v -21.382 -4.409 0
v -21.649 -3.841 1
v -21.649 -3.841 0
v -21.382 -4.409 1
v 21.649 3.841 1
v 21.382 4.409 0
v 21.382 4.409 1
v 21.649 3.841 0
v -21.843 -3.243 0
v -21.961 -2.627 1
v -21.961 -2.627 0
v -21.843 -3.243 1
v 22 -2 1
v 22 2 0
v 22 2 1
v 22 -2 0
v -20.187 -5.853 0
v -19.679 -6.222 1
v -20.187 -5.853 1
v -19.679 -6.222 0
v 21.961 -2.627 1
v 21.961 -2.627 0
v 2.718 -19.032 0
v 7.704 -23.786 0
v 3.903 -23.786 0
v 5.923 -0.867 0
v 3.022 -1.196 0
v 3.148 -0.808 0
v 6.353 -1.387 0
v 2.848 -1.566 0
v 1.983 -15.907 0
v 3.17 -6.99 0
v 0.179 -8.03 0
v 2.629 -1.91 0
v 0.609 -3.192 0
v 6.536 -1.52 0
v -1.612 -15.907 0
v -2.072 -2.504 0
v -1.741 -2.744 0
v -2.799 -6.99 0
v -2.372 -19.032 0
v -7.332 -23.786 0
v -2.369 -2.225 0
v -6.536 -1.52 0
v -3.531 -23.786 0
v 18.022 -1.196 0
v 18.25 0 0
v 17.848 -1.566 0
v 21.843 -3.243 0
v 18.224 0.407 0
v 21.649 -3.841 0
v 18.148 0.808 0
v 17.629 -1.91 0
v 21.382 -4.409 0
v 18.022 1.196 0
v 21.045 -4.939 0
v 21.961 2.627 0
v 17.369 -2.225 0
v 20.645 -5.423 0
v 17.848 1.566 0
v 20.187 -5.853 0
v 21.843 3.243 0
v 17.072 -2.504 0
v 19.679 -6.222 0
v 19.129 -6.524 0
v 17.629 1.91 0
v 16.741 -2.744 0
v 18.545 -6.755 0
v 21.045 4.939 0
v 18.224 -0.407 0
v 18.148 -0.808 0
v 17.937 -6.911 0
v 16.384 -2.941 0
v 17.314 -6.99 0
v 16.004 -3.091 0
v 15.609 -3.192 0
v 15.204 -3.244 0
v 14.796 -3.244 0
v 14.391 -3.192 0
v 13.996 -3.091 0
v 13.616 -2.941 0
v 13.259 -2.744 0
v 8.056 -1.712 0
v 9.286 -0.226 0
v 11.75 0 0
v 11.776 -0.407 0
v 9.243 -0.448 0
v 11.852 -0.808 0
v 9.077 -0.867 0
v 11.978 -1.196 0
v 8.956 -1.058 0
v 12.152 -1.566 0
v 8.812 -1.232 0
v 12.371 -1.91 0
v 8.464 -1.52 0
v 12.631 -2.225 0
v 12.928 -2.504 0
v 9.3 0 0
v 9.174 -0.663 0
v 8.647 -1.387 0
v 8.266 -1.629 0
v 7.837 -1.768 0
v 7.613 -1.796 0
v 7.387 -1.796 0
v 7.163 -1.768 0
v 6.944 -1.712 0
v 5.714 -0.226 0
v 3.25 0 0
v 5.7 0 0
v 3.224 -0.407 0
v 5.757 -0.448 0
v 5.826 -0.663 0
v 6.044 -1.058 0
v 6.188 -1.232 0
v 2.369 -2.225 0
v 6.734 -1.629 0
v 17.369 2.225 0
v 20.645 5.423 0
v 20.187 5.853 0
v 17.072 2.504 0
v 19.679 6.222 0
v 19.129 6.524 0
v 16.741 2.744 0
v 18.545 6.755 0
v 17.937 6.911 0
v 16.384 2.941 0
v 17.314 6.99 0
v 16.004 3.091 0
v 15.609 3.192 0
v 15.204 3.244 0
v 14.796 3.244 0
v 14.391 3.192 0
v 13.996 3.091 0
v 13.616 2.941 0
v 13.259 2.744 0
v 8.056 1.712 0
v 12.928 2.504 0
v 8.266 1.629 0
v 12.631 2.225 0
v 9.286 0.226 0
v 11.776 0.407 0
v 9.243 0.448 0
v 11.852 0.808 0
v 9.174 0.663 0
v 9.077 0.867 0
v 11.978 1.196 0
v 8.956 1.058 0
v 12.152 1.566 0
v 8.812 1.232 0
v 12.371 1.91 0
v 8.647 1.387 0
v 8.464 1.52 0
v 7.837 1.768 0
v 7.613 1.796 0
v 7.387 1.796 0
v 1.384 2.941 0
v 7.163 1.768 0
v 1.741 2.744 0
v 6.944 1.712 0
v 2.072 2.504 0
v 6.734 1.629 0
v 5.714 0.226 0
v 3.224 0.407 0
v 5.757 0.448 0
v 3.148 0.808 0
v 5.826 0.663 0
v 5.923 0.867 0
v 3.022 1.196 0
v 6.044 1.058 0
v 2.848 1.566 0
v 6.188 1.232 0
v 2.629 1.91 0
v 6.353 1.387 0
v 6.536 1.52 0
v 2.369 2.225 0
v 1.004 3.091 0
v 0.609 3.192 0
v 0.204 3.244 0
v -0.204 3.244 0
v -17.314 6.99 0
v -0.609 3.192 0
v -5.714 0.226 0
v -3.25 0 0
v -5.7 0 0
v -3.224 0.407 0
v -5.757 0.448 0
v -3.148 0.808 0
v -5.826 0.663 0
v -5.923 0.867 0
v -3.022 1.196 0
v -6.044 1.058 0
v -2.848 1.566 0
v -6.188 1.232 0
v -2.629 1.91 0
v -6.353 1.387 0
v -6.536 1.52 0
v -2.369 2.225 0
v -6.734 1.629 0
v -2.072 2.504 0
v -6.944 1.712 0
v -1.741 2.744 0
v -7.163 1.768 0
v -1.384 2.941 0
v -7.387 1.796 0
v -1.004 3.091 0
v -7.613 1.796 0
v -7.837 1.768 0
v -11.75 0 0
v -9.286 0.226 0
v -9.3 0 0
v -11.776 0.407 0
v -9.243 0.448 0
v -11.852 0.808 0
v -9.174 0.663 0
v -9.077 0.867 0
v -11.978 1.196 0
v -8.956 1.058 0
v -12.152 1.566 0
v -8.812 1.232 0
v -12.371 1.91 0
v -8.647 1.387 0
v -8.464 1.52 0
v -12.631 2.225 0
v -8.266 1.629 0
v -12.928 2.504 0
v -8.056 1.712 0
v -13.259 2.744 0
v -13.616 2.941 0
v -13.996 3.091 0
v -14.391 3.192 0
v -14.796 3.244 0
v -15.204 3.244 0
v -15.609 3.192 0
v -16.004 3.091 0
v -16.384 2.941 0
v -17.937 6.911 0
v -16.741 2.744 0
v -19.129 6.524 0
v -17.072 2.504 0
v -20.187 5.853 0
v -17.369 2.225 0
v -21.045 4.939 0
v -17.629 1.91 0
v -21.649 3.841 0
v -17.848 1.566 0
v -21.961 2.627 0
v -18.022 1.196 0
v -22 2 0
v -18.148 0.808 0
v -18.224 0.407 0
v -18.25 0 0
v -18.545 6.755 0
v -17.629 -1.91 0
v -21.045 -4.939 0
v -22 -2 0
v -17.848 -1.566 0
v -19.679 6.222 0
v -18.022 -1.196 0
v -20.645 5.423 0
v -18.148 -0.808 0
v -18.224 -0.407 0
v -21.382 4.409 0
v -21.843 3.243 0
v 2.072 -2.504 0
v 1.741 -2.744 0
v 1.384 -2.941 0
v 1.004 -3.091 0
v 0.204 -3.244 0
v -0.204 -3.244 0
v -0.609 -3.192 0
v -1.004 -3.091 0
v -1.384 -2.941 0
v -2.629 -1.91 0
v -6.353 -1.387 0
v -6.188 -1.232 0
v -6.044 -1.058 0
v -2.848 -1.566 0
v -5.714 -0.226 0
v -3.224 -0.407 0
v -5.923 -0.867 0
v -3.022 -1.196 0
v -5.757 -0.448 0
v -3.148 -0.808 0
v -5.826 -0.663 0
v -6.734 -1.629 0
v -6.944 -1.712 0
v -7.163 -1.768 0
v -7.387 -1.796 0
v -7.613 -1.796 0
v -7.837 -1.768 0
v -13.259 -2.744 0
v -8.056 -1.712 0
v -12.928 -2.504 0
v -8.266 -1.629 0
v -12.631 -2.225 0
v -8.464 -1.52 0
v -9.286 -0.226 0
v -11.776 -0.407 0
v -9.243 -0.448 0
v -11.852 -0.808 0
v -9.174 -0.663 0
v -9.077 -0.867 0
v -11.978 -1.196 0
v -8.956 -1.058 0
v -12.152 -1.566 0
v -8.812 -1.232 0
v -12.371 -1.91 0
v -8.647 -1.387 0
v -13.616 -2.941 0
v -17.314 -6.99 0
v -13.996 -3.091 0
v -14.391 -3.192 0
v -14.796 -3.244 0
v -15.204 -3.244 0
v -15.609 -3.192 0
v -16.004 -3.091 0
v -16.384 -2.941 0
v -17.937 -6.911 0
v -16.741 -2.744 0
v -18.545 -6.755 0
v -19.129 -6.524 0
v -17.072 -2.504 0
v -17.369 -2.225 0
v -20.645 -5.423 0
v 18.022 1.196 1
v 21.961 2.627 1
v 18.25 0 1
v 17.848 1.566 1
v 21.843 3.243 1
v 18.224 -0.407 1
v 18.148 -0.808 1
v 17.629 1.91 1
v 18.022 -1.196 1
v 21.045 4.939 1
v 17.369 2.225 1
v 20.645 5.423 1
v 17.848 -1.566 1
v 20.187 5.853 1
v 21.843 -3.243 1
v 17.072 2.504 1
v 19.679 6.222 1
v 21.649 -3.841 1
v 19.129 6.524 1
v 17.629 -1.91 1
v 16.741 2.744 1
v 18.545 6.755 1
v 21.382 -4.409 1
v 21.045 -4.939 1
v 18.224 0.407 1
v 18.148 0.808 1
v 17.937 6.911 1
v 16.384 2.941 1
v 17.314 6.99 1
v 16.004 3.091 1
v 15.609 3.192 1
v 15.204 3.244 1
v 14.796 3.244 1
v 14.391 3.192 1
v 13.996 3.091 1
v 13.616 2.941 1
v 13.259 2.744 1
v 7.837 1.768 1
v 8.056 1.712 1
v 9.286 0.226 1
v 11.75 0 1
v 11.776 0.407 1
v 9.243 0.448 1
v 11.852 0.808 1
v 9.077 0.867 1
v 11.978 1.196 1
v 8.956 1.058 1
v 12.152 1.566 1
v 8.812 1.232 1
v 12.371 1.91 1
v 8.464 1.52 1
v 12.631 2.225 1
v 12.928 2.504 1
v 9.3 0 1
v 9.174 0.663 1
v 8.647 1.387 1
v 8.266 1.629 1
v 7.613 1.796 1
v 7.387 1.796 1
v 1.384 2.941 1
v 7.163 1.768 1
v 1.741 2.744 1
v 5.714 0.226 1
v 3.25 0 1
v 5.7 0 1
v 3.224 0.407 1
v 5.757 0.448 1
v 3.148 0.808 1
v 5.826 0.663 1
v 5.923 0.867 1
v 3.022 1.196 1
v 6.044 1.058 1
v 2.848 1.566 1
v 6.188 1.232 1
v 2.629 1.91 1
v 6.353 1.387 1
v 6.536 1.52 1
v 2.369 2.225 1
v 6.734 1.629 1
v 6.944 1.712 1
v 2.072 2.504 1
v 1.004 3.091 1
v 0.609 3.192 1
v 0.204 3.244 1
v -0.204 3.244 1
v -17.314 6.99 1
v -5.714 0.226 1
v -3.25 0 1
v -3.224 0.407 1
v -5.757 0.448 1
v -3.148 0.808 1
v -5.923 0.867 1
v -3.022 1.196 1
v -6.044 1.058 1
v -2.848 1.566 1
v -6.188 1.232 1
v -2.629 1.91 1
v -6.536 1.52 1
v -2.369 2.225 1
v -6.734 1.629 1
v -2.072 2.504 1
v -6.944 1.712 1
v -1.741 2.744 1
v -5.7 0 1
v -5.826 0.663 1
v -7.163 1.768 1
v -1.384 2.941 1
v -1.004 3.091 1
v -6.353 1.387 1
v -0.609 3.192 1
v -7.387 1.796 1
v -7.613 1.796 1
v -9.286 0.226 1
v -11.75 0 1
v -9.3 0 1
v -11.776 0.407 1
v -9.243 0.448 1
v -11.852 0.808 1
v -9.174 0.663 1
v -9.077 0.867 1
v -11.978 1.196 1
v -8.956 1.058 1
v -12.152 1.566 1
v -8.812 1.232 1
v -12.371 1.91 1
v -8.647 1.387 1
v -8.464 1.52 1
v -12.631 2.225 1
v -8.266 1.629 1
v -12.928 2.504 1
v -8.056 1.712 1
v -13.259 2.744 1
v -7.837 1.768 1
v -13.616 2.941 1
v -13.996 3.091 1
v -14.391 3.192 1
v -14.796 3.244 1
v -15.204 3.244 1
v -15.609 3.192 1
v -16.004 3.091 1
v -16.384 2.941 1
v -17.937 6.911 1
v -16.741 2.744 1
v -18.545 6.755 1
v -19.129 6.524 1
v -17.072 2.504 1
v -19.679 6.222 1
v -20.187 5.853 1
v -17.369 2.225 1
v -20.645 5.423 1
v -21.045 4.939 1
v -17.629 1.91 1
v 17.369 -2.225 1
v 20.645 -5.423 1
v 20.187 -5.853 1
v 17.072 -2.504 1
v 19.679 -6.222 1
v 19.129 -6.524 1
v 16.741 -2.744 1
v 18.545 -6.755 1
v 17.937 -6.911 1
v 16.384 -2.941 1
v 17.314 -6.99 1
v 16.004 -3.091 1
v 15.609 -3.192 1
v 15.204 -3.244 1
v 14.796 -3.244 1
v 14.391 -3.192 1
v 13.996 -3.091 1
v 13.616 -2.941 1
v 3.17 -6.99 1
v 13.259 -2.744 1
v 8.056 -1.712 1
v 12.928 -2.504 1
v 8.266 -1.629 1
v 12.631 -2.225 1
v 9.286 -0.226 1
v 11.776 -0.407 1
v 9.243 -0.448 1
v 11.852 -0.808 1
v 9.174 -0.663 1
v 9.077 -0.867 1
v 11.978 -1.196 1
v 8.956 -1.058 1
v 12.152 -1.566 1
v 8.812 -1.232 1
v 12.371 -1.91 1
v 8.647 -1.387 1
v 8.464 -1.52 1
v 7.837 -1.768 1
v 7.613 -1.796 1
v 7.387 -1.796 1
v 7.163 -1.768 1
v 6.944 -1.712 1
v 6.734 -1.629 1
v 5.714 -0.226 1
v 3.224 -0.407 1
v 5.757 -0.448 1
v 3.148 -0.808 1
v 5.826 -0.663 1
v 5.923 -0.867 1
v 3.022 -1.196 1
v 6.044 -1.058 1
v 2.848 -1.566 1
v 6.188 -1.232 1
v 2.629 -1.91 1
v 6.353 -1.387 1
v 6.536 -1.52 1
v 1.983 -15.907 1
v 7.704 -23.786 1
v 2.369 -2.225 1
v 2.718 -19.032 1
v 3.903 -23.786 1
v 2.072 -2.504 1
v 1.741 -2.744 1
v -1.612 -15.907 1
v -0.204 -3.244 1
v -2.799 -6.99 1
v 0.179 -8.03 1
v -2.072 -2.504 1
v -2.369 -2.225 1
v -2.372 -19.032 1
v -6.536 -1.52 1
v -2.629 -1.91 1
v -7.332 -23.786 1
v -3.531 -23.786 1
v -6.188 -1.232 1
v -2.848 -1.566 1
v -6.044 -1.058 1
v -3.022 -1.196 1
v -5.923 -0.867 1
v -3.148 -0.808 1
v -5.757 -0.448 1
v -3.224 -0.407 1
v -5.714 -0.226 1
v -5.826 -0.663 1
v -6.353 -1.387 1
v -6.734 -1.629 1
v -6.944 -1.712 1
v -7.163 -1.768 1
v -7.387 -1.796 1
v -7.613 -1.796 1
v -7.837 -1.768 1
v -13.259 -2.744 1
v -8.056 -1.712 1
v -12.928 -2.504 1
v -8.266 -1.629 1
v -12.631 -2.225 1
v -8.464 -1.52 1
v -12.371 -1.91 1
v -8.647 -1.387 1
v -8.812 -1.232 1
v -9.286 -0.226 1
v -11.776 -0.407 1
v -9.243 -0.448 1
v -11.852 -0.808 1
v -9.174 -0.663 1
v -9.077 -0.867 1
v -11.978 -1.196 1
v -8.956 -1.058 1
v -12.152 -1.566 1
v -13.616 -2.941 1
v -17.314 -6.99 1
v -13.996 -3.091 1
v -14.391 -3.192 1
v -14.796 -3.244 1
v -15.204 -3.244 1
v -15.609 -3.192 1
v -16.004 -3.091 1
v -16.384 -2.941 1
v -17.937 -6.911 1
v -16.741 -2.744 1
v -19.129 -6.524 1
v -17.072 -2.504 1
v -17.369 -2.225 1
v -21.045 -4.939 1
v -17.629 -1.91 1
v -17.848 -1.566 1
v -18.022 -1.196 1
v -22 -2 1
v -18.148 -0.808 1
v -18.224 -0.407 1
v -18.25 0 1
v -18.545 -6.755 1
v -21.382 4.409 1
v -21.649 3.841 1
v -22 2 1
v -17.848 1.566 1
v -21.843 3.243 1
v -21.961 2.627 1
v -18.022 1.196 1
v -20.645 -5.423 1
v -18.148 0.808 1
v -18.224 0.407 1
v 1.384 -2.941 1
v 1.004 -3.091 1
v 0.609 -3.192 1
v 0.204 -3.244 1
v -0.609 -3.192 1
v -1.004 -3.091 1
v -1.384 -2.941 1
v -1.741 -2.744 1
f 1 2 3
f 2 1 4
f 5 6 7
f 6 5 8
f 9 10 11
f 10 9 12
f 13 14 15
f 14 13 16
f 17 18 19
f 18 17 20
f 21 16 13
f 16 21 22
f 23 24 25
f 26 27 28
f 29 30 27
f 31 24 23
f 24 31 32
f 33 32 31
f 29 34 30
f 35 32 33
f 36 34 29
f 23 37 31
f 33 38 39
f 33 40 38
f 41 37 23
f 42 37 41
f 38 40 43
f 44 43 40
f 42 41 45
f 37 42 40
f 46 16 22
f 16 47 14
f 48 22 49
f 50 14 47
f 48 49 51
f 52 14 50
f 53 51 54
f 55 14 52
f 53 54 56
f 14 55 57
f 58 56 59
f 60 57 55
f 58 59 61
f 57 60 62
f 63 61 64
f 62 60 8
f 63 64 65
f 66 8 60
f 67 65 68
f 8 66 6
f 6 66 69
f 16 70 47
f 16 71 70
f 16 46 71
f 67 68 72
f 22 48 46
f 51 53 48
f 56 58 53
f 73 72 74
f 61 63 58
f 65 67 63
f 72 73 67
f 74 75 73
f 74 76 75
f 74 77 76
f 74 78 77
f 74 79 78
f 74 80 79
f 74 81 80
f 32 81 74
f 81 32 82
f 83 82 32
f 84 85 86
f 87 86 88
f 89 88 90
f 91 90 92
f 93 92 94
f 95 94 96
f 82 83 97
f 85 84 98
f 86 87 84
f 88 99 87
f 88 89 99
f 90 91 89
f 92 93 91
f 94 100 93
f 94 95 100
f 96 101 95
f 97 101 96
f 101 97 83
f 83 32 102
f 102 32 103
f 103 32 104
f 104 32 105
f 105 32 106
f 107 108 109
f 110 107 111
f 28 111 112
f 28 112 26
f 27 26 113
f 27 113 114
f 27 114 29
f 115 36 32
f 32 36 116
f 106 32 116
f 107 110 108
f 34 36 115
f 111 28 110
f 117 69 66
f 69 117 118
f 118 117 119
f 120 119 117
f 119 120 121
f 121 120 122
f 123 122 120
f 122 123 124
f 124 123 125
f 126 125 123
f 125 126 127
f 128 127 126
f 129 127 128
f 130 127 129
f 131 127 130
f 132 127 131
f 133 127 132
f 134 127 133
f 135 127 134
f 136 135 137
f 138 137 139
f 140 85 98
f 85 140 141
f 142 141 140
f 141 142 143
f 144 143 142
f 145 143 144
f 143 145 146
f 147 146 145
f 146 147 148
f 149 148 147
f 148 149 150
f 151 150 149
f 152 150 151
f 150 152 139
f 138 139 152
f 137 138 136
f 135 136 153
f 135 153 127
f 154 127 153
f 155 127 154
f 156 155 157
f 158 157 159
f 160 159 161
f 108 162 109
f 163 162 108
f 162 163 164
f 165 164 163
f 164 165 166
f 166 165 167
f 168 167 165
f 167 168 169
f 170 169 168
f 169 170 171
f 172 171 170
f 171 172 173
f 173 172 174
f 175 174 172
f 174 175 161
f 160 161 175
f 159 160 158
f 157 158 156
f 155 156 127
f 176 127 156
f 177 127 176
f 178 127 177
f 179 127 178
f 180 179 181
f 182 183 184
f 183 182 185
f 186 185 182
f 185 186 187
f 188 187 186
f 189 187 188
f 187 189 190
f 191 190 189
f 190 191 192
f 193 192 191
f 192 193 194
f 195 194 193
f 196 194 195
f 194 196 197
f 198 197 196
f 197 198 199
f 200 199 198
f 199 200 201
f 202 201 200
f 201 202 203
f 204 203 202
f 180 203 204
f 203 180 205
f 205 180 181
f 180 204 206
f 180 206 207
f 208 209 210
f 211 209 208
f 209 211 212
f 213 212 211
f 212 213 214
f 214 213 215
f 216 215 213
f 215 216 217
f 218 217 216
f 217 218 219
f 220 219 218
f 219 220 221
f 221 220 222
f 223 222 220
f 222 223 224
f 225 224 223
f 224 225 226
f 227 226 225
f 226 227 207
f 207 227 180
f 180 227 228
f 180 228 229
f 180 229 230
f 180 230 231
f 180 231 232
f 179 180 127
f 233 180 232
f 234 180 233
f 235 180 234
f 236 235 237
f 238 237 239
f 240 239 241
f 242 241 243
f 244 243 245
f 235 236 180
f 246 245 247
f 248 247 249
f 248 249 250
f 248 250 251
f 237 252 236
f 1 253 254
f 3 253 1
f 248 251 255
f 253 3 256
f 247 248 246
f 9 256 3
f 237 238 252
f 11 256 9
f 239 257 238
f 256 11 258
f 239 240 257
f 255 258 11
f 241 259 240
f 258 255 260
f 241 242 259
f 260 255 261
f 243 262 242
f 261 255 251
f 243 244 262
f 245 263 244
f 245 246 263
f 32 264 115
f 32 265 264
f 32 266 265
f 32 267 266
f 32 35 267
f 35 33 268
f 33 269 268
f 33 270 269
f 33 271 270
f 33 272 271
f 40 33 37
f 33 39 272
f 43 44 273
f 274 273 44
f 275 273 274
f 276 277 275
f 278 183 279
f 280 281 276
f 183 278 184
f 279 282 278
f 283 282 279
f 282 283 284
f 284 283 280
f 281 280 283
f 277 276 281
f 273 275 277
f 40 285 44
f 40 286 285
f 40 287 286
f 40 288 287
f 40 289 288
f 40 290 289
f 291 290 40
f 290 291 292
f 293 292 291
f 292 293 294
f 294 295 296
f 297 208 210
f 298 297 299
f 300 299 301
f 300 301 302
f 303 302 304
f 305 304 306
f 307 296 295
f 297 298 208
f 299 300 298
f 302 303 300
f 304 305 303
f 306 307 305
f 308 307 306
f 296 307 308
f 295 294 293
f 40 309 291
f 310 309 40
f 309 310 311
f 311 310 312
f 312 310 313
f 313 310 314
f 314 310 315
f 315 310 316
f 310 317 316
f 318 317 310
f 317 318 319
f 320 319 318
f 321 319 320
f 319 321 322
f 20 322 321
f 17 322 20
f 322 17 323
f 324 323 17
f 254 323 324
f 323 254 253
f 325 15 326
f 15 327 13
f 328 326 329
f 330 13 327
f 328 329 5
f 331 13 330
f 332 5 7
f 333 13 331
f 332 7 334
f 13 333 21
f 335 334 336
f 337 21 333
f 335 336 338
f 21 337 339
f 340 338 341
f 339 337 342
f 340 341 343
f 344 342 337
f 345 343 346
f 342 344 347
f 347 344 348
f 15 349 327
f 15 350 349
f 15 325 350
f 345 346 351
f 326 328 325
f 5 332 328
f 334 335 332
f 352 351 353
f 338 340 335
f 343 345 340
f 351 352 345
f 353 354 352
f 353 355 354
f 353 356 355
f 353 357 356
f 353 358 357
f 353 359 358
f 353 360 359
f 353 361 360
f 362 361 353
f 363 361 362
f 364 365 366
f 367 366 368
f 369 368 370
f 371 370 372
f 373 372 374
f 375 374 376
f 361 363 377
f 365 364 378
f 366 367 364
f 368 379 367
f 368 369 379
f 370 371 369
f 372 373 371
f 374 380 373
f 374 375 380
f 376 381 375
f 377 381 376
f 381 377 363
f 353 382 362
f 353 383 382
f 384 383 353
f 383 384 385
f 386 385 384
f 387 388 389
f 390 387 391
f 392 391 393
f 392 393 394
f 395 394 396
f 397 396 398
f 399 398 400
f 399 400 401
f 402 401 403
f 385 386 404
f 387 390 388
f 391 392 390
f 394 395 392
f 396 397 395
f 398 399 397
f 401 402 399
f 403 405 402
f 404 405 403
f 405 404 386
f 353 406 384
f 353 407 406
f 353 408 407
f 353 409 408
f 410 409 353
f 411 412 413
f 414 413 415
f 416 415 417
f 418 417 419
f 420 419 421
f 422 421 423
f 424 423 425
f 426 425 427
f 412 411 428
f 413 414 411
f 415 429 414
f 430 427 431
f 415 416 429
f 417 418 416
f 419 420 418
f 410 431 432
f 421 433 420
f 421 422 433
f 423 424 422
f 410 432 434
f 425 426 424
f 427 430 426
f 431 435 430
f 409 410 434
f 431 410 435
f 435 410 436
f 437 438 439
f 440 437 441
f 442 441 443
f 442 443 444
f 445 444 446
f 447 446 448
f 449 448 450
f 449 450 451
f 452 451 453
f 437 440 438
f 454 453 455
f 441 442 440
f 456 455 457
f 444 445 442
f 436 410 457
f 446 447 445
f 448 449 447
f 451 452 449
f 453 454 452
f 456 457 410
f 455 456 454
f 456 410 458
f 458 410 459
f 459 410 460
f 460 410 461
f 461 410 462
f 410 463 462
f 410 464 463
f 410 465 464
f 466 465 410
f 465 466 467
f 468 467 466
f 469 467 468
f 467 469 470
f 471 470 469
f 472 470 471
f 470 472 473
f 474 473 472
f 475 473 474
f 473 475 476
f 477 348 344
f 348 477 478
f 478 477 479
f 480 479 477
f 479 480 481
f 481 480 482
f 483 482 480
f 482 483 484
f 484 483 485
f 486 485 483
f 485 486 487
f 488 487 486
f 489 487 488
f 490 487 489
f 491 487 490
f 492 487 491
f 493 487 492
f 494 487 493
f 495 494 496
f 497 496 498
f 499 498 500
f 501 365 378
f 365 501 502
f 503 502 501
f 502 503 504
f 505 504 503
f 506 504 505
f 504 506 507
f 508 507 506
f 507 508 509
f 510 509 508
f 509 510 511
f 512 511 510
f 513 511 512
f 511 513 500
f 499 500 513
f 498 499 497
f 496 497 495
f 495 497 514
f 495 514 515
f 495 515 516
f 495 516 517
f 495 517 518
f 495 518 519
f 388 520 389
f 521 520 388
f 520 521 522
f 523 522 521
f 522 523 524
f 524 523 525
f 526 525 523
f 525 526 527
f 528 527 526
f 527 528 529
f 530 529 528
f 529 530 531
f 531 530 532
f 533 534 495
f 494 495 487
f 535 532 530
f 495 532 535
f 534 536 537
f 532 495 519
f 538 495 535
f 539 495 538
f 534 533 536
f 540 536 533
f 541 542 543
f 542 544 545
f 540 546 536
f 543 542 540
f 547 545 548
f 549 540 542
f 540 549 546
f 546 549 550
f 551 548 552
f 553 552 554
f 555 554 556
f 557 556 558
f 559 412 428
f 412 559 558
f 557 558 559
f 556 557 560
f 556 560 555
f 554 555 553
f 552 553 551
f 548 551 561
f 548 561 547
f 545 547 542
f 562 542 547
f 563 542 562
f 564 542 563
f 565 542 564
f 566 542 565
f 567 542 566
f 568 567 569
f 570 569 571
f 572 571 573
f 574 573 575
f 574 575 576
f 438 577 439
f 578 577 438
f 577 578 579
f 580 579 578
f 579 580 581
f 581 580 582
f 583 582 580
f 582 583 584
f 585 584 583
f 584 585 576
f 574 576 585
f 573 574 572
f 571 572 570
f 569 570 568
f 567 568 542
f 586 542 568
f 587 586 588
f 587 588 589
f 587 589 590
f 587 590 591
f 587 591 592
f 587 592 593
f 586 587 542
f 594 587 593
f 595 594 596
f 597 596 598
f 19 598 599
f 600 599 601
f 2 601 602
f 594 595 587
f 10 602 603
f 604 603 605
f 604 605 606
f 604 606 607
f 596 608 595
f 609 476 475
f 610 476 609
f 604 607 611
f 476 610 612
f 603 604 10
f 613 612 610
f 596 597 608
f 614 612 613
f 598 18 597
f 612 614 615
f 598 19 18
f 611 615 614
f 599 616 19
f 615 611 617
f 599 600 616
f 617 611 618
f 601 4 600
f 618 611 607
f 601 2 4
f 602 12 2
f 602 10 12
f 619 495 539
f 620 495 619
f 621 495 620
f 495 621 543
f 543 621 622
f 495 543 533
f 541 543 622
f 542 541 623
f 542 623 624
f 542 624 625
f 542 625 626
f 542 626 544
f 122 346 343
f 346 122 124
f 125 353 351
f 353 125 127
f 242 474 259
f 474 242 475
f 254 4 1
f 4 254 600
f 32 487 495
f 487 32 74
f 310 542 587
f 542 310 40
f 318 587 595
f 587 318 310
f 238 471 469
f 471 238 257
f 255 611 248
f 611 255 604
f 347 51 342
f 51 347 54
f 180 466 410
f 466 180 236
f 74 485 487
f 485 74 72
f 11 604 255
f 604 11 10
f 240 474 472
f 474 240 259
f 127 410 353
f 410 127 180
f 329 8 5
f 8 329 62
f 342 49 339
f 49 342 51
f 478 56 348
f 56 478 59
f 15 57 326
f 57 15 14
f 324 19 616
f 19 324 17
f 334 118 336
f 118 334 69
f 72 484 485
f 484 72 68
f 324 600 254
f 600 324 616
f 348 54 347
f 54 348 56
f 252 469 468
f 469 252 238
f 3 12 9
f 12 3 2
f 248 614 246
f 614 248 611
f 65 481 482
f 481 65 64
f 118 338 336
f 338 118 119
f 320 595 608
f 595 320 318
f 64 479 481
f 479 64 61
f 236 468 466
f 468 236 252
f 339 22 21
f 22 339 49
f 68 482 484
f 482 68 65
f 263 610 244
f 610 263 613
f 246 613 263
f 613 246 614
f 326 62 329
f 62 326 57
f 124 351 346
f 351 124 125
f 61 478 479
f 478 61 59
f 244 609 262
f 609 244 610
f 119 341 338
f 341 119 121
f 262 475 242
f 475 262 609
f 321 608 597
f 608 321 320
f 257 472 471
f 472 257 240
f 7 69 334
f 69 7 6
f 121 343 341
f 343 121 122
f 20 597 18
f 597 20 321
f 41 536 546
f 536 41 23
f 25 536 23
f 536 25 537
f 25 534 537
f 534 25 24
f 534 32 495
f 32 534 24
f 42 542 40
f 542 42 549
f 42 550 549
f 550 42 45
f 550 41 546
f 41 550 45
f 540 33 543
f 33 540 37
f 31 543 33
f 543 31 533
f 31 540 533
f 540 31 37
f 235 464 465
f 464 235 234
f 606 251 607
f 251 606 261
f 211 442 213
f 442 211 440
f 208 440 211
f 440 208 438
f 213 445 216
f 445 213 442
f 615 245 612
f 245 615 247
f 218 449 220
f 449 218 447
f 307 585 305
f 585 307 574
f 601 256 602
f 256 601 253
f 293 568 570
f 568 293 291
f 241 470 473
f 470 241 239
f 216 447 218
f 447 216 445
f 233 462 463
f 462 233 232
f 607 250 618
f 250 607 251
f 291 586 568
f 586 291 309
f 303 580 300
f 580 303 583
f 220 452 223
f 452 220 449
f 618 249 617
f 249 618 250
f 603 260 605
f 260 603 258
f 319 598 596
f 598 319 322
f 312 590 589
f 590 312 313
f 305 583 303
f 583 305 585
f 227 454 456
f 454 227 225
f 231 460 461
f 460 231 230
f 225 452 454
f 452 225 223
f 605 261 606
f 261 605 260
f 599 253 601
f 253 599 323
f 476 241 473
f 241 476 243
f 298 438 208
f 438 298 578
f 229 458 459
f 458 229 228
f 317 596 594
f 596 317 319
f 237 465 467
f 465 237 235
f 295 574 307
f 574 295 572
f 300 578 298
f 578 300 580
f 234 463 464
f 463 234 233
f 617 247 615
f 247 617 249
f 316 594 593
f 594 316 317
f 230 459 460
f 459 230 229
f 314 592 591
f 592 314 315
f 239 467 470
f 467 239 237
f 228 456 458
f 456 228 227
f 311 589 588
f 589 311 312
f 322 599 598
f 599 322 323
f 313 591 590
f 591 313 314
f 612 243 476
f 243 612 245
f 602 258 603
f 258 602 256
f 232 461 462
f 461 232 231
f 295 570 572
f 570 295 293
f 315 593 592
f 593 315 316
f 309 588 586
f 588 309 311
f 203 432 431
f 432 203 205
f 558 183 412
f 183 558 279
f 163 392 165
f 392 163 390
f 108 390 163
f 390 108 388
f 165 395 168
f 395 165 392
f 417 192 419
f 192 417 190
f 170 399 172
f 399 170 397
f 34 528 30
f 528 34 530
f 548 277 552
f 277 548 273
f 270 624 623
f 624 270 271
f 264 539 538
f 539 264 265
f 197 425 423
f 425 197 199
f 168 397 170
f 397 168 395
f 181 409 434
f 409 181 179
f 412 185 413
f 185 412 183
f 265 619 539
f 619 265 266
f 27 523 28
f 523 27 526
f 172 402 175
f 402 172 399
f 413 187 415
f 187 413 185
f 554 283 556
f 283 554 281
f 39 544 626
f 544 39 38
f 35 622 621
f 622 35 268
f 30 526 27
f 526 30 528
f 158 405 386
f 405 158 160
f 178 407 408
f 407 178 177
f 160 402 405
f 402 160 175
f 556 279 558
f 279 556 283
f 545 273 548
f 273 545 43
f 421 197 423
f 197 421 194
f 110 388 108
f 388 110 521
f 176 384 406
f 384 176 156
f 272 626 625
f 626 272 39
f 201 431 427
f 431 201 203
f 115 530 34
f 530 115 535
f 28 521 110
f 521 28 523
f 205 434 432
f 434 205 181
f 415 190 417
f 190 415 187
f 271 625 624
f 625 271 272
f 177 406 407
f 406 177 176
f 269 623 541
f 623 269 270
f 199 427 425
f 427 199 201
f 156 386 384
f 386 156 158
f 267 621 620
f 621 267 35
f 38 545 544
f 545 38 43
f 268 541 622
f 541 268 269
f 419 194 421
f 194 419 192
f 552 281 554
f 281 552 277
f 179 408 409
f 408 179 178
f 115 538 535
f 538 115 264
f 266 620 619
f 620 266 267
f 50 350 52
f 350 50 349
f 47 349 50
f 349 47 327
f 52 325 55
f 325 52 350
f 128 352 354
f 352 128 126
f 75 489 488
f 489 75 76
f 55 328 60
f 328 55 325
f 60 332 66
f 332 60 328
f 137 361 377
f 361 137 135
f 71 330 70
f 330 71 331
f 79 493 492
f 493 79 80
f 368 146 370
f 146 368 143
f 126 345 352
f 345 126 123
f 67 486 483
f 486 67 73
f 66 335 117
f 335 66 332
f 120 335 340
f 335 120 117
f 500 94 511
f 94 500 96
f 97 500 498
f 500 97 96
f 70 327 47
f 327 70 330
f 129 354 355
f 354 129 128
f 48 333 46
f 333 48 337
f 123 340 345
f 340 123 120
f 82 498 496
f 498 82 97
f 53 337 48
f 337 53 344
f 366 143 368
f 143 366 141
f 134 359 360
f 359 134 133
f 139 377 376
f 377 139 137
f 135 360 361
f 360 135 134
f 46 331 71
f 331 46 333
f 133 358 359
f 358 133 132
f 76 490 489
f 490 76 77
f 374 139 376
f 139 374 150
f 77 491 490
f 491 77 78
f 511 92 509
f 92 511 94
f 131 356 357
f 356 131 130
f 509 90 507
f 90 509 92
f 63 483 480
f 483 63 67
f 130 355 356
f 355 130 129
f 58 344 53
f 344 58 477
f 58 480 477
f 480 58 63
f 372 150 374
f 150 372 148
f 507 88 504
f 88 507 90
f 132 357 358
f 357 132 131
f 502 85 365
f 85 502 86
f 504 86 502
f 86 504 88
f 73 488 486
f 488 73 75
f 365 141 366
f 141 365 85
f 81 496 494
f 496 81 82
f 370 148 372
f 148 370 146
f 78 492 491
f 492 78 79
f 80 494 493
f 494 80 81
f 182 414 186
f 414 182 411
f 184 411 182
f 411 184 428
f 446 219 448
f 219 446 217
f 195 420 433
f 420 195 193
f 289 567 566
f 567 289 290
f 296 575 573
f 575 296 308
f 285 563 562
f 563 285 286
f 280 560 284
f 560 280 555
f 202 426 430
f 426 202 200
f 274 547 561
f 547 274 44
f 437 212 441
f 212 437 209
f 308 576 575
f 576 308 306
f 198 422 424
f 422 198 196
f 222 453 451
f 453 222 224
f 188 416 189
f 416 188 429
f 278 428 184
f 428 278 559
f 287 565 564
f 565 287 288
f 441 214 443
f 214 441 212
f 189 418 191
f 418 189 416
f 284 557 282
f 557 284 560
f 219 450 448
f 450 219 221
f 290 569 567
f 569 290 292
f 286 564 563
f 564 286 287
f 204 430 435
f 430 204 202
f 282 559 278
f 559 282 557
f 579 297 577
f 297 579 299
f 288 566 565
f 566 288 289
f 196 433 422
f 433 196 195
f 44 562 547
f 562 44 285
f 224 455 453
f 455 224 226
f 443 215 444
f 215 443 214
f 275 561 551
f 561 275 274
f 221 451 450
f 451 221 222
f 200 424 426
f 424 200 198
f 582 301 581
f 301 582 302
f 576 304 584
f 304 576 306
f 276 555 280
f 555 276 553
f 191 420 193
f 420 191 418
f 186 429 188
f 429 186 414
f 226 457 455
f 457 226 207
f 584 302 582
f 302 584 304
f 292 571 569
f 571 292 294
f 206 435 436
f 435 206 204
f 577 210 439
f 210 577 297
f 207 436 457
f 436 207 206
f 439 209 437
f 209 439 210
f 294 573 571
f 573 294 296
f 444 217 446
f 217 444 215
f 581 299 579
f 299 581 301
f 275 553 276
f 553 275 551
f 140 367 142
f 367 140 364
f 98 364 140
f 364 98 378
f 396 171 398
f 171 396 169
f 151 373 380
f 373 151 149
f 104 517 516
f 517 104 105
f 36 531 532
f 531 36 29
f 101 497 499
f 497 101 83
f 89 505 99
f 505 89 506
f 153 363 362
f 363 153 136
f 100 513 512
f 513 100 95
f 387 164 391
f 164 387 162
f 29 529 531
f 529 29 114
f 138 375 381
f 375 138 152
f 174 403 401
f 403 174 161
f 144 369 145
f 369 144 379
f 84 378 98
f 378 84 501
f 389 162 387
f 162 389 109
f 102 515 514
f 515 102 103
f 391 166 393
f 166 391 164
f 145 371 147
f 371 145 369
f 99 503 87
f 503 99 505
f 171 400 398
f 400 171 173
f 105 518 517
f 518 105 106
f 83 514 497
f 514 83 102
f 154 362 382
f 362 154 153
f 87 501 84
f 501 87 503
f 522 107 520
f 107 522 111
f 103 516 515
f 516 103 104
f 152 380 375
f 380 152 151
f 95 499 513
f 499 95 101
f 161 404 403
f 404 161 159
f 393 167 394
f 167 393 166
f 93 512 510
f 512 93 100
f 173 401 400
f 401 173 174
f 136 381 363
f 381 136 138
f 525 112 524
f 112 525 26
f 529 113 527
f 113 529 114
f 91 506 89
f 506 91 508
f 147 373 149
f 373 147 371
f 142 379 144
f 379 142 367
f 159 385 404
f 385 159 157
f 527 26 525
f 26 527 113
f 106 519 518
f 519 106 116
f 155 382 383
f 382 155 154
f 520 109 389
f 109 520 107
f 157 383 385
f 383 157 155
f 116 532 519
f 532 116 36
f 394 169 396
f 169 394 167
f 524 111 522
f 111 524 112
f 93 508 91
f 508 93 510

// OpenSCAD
$fn = 50;


difference() {
	union() {
		*color(alpha = 1.0000000000, c = "gray") {
			translate(v = [0, 14, 0]) {
				linear_extrude(height = 1) {
					text(font = "Arial:style=Bold", halign = "center", size = 4.5000000000, text = "COMMENT description oobb_plate_shape_p_type_1_depth_3_width_1_thickness_a_extra_oobb_size", valign = "center");
				}
			}
		}
		hull() {
			translate(v = [-17.0000000000, 2.0000000000, 0]) {
				cylinder(h = 1, r = 5);
			}
			translate(v = [17.0000000000, 2.0000000000, 0]) {
				cylinder(h = 1, r = 5);
			}
			translate(v = [-17.0000000000, -2.0000000000, 0]) {
				cylinder(h = 1, r = 5);
			}
			translate(v = [17.0000000000, -2.0000000000, 0]) {
				cylinder(h = 1, r = 5);
			}
		}
		translate(v = [0, -5, 0]) {
			linear_extrude(height = 1) {
				text(font = "DejaVu Sans Mono:style=Bold", halign = "center", size = 19.0000000000, text = "A", valign = "top");
			}
		}
	}
	union() {
		*color(alpha = 1.0000000000, c = "gray") {
			translate(v = [0, 14, 0]) {
				linear_extrude(height = 1) {
					text(font = "Arial:style=Bold", halign = "center", size = 4.5000000000, text = "COMMENT description oobb_holes_shape_n_type_3_width_1_thickness_a_extra_oobb_size_1_height_'all'_holes_true_both_holes", valign = "center");
				}
			}
		}
		translate(v = [-15.0000000000, 0.0000000000, 0]) {
			translate(v = [0, 0, -50]) {
				cylinder(h = 100, r = 3.2500000000);
			}
		}
		translate(v = [0, 0, -50]) {
			cylinder(h = 100, r = 3.2500000000);
		}
		translate(v = [15.0000000000, 0.0000000000, 0]) {
			translate(v = [0, 0, -50]) {
				cylinder(h = 100, r = 3.2500000000);
			}
		}
		translate(v = [-15.0000000000, 0.0000000000, 0]) {
			translate(v = [0, 0, -50]) {
				cylinder(h = 100, r = 1.8000000000);
			}
		}
		translate(v = [-7.5000000000, 0.0000000000, 0]) {
			translate(v = [0, 0, -50]) {
				cylinder(h = 100, r = 1.8000000000);
			}
		}
		translate(v = [0, 0, -50]) {
			cylinder(h = 100, r = 1.8000000000);
		}
		translate(v = [7.5000000000, 0.0000000000, 0]) {
			translate(v = [0, 0, -50]) {
				cylinder(h = 100, r = 1.8000000000);
			}
		}
		translate(v = [15.0000000000, 0.0000000000, 0]) {
			translate(v = [0, 0, -50]) {
				cylinder(h = 100, r = 1.8000000000);
			}
		}
	}
}
